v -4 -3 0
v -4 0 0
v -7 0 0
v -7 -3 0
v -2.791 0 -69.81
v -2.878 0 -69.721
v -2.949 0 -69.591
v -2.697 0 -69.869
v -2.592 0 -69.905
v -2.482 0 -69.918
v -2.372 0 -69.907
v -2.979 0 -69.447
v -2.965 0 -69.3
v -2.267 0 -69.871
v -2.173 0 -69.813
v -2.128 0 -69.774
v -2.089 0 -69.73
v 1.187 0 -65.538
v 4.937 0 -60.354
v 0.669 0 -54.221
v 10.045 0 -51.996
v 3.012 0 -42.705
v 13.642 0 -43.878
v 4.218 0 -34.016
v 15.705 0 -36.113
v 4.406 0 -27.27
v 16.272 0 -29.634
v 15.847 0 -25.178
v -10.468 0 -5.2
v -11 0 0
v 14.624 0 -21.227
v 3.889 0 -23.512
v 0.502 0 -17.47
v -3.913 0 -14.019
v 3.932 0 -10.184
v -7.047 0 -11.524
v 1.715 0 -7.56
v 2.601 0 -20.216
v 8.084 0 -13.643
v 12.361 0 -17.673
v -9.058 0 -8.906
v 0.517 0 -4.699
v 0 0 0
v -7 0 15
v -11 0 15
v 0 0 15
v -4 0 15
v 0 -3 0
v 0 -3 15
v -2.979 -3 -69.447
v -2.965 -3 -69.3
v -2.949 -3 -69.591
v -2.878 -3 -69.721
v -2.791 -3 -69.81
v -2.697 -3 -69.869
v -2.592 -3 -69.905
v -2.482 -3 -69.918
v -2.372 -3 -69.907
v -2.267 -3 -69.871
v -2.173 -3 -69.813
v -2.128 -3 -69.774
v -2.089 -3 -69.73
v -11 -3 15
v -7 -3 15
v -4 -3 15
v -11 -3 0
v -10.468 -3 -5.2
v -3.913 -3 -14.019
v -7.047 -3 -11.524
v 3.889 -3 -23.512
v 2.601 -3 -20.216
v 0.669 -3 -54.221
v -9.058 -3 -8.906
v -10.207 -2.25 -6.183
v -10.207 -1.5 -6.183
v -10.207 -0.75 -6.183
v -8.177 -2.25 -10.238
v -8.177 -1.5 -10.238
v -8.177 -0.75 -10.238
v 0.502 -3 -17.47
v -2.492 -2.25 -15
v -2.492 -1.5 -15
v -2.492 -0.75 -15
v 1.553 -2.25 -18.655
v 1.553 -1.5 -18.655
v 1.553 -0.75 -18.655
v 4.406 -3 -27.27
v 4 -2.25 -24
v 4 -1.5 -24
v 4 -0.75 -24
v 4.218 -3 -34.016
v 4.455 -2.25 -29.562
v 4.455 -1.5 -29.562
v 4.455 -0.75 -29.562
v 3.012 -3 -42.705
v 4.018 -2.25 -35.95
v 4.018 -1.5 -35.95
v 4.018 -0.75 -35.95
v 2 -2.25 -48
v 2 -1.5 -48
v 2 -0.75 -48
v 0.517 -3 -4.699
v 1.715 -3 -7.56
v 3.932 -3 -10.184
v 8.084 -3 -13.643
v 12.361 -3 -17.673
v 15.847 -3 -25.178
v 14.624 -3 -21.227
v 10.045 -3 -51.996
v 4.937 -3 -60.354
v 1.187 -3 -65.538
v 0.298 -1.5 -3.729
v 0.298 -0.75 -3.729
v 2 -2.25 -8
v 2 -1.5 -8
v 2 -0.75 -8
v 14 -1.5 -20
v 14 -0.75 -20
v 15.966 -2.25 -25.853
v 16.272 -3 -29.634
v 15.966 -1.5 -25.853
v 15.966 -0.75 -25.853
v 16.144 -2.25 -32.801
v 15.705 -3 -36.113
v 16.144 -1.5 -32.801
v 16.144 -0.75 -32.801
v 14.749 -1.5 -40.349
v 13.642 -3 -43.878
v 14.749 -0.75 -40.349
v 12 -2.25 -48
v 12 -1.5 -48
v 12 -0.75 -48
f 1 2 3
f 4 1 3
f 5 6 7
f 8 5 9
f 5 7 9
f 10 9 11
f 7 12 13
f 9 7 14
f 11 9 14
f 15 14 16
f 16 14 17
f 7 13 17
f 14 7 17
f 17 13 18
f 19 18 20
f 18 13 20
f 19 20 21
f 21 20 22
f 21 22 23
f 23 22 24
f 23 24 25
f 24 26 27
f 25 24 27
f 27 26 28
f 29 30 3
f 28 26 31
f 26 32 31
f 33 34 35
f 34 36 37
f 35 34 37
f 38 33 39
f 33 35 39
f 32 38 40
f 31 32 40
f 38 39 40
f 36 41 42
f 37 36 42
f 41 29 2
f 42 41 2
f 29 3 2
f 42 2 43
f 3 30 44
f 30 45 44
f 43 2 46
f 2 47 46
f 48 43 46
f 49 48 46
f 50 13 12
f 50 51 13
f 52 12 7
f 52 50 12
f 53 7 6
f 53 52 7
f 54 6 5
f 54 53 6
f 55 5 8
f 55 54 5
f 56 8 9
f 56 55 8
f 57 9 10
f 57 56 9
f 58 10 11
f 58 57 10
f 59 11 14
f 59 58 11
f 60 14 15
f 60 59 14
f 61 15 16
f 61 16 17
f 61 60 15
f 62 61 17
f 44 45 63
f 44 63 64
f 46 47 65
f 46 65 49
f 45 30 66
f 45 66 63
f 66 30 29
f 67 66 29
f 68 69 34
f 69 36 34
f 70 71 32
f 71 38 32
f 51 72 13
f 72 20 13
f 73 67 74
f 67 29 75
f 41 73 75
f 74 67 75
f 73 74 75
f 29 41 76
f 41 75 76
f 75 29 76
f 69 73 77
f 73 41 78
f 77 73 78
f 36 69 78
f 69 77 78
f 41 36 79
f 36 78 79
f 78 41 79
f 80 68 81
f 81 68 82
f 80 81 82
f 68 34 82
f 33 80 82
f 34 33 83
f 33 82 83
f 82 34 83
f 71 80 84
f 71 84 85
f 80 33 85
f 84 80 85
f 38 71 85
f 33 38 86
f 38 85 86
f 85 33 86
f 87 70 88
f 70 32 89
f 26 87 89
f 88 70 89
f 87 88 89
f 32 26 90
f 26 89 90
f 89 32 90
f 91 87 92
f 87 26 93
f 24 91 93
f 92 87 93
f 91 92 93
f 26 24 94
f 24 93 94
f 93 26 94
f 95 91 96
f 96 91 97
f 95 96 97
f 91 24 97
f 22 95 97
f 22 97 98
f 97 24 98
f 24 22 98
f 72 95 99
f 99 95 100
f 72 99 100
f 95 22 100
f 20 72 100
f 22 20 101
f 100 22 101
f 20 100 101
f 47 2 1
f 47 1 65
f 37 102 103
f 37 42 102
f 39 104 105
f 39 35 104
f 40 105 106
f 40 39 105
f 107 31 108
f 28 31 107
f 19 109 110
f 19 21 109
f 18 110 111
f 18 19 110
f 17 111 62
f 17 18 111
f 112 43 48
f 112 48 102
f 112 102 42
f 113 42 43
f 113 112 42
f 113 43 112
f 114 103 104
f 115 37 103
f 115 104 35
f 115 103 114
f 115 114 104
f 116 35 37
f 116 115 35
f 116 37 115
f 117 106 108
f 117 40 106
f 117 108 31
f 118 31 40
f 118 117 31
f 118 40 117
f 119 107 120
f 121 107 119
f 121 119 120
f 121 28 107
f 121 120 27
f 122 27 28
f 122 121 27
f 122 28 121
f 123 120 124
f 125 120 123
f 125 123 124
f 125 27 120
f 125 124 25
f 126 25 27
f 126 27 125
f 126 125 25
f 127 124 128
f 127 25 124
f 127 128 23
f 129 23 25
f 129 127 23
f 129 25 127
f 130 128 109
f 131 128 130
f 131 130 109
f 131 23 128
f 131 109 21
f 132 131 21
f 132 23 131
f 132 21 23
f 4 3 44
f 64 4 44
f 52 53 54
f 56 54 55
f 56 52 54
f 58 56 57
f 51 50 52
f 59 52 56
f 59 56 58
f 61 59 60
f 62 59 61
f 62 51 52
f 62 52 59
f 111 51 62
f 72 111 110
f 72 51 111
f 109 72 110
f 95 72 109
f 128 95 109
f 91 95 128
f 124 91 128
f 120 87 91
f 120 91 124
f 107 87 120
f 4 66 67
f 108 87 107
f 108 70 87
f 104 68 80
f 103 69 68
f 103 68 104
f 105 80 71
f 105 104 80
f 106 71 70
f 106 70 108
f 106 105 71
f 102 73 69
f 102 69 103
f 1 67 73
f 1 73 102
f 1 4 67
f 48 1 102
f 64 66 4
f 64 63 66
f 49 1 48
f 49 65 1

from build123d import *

# Parameters (mm, degrees)
F0_W     = 4
F0_H     = 15
F1_DEPTH = 3
F2_R     = 0.5


with BuildPart() as f1:
    # F0 (on Front) → F1 (new body)
    with BuildSketch(Plane.XZ):
        with Locations((-9, 7.5)):
            Rectangle(F0_W, F0_H)
        with BuildLine():
            add(Edge.make_bspline(
                [(0, 0), (0, -2), (0.3118573184, -9.9786341961), (19.0287578525, -18.2269819864), (15.032005126, -49.0601420072), (0, -67.0831354716), (-3.5, -71.5)],
                knots=[0, 0, 0, 0, 0.1632050001, 0.3973335384, 0.6984522797, 1, 1, 1, 1], degree=3))
            Line((0, 0), (-4, 0))
            Line((-4, 0), (-7, 0))
            Line((-7, 0), (-11, 0))
            add(Edge.make_bspline(
                [(-11, 0), (-11, -10), (-2.5456818177, -14.1496144068), (6.7499129169, -23.144037682), (1.3109915507, -52.2184440443), (0, -57.0831354716), (-3.5, -71.5)],
                knots=[0, 0, 0, 0, 0.2399821467, 0.4324939201, 0.7160944044, 1, 1, 1, 1], degree=3))
        make_face()
        with Locations((-2, 7.5)):
            Rectangle(F0_W, F0_H)
    extrude(amount=F1_DEPTH)

    # F2
    f2_edges = [f1.edges().sort_by_distance(p)[0] for p in [
        (-3.5, -1.5, -71.5),
    ]]
    fillet(f2_edges, radius=F2_R)


solid = f1.part
